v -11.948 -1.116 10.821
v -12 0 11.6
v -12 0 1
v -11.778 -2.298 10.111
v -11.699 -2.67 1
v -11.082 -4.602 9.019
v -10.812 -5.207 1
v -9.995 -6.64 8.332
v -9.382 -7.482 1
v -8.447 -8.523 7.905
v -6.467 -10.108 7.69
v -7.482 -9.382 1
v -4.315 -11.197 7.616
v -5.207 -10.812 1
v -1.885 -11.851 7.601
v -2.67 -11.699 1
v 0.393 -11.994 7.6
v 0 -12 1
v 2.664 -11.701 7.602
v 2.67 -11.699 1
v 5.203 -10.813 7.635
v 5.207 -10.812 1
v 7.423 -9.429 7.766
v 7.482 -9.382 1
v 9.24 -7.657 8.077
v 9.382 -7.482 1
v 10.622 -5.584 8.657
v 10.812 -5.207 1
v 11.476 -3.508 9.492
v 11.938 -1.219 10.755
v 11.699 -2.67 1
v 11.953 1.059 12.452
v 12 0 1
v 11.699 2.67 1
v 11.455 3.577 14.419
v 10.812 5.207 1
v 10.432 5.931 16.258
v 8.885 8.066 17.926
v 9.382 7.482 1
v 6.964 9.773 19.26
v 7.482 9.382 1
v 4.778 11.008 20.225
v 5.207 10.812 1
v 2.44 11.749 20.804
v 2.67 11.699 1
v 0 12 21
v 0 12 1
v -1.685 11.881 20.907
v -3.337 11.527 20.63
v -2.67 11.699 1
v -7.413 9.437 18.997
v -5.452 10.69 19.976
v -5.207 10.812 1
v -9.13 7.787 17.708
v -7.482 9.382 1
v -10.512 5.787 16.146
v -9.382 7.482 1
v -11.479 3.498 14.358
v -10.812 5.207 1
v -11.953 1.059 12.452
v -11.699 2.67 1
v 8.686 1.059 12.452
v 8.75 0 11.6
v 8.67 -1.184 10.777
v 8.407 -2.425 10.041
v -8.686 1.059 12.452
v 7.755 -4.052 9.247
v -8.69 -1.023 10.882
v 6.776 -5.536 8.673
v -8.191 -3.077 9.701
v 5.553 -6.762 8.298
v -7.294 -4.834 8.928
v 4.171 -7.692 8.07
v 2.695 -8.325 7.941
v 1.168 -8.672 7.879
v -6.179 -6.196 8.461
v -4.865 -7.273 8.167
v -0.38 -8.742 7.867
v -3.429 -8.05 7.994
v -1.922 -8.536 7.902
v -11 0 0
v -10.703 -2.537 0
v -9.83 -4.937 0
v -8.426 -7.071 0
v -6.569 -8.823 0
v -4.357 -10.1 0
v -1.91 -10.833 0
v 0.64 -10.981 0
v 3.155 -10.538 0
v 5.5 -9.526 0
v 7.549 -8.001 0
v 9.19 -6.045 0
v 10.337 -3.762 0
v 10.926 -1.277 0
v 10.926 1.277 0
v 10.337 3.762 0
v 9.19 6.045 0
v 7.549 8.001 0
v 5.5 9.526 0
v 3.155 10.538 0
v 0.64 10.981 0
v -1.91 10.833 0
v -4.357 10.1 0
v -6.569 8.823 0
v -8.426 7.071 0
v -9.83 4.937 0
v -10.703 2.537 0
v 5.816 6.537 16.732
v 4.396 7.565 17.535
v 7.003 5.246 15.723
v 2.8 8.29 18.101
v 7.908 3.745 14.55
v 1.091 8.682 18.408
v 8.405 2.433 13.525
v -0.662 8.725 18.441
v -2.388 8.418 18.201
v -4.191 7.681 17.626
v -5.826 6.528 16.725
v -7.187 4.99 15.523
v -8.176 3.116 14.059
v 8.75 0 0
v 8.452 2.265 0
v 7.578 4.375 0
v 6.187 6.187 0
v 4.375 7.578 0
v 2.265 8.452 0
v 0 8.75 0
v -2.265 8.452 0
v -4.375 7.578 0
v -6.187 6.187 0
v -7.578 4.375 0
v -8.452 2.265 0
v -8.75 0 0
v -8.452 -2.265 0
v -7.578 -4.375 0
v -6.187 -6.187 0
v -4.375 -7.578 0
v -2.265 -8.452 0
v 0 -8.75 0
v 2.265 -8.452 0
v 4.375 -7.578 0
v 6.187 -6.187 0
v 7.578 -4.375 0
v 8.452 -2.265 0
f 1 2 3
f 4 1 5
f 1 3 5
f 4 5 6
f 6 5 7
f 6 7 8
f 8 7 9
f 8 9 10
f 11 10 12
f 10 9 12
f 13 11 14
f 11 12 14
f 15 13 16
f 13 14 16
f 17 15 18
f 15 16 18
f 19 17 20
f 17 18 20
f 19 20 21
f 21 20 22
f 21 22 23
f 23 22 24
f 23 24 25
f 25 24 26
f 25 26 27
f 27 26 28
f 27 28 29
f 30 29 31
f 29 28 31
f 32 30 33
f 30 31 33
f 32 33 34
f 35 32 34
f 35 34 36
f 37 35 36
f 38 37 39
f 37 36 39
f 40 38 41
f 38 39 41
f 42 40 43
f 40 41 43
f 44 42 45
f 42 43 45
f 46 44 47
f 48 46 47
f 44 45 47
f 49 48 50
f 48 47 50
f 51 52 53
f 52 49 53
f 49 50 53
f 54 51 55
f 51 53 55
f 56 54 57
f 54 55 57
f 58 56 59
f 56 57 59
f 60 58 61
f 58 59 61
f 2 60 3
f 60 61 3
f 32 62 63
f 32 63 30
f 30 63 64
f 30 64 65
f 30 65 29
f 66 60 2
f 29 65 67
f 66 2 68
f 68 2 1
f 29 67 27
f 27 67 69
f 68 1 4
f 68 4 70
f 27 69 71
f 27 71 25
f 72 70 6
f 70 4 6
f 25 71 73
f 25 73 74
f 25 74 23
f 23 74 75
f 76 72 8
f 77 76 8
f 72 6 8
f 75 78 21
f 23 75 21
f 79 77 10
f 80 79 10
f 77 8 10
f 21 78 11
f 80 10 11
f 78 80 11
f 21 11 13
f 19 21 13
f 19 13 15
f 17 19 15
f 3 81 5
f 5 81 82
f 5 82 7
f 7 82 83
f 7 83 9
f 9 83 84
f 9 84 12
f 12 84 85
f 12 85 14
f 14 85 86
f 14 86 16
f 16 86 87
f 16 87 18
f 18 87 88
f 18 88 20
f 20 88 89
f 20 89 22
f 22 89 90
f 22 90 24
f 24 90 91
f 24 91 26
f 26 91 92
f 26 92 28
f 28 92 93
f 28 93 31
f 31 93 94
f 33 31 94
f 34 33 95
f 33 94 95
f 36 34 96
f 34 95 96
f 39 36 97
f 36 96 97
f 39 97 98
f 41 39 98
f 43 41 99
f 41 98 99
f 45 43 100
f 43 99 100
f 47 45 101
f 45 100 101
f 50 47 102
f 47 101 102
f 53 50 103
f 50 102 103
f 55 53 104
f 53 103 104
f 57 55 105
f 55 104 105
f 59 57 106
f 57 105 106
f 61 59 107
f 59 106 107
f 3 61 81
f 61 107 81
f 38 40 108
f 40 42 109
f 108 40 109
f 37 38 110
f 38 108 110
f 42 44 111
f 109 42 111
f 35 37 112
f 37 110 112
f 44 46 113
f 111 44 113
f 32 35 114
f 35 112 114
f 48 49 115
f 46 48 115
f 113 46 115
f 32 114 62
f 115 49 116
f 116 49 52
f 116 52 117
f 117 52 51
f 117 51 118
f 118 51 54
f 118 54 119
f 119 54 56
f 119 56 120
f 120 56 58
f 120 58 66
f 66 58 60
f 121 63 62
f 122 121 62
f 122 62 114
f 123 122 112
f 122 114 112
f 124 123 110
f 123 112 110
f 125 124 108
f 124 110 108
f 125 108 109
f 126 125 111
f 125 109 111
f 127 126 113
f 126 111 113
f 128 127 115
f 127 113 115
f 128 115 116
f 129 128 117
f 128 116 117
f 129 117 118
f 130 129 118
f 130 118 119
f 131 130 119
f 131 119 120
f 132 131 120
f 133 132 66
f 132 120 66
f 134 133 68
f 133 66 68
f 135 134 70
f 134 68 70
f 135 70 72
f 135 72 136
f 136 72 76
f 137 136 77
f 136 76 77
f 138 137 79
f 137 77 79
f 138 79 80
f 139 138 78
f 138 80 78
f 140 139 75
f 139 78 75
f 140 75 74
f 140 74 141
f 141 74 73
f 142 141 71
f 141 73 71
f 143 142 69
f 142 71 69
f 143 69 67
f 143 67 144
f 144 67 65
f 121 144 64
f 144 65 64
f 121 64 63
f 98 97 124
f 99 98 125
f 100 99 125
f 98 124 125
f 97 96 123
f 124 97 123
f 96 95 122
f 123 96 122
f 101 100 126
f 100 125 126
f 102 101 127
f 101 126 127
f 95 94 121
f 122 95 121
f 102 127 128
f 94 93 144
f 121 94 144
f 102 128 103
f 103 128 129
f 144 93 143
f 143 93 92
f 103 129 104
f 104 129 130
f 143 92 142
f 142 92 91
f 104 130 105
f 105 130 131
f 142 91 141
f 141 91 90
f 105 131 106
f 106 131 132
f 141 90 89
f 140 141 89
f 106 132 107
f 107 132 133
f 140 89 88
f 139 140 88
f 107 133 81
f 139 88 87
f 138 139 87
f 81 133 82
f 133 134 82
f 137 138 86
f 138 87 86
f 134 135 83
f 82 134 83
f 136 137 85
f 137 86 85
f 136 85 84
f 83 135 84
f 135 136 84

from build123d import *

# Parameters (mm, degrees)
SKETCH_1_R               = 12
EXTRUDE_1_DEPTH          = 21
CUT_EXTRUDE_1_DEPTH      = 21
CUT_EXTRUDE_1_DEPTH_BACK = 21
HOLE_WIZARD_M20_2_D      = 17.5
CHAMFER_2_SIZE           = 1


with BuildPart() as part:
    # 草图1 → 凸台-拉伸1 (new body)
    with BuildSketch(Plane.XY):
        Circle(SKETCH_1_R)
    extrude(amount=EXTRUDE_1_DEPTH)

    # 草图2 → 切除-拉伸1 (cut, two sides: drawn at the far end of the back side and taken through both)
    with BuildSketch(Plane(origin=(0, 0, 0), x_dir=(0, 0, -1), z_dir=(1, 0, 0)).offset(-CUT_EXTRUDE_1_DEPTH_BACK)):
        with BuildLine():
            Line((-21, 12), (-12.451705037, 1.058681393))
            ThreePointArc((-12.451705037, 1.058681393), (-8.852121463, -5.034581824), (-7.6, -12))
            Line((-7.6, -12), (-21, -12))
            Line((-21, -12), (-21, 12))
        make_face()
    extrude(amount=CUT_EXTRUDE_1_DEPTH + CUT_EXTRUDE_1_DEPTH_BACK, mode=Mode.SUBTRACT)

    # M20 螺纹孔2 (through all)
    with Locations(Plane(origin=(0, 0, 0), x_dir=(-1, 0, 0), z_dir=(0, 0, -1))):
        with Locations((0, 0)):
            Hole(HOLE_WIZARD_M20_2_D / 2)

    # 倒角2
    chamfer_2_edges = [part.edges().sort_by_distance(p)[0] for p in [
        (-12, 0, 0),
    ]]
    chamfer(chamfer_2_edges, length=CHAMFER_2_SIZE)


solid = part.part
